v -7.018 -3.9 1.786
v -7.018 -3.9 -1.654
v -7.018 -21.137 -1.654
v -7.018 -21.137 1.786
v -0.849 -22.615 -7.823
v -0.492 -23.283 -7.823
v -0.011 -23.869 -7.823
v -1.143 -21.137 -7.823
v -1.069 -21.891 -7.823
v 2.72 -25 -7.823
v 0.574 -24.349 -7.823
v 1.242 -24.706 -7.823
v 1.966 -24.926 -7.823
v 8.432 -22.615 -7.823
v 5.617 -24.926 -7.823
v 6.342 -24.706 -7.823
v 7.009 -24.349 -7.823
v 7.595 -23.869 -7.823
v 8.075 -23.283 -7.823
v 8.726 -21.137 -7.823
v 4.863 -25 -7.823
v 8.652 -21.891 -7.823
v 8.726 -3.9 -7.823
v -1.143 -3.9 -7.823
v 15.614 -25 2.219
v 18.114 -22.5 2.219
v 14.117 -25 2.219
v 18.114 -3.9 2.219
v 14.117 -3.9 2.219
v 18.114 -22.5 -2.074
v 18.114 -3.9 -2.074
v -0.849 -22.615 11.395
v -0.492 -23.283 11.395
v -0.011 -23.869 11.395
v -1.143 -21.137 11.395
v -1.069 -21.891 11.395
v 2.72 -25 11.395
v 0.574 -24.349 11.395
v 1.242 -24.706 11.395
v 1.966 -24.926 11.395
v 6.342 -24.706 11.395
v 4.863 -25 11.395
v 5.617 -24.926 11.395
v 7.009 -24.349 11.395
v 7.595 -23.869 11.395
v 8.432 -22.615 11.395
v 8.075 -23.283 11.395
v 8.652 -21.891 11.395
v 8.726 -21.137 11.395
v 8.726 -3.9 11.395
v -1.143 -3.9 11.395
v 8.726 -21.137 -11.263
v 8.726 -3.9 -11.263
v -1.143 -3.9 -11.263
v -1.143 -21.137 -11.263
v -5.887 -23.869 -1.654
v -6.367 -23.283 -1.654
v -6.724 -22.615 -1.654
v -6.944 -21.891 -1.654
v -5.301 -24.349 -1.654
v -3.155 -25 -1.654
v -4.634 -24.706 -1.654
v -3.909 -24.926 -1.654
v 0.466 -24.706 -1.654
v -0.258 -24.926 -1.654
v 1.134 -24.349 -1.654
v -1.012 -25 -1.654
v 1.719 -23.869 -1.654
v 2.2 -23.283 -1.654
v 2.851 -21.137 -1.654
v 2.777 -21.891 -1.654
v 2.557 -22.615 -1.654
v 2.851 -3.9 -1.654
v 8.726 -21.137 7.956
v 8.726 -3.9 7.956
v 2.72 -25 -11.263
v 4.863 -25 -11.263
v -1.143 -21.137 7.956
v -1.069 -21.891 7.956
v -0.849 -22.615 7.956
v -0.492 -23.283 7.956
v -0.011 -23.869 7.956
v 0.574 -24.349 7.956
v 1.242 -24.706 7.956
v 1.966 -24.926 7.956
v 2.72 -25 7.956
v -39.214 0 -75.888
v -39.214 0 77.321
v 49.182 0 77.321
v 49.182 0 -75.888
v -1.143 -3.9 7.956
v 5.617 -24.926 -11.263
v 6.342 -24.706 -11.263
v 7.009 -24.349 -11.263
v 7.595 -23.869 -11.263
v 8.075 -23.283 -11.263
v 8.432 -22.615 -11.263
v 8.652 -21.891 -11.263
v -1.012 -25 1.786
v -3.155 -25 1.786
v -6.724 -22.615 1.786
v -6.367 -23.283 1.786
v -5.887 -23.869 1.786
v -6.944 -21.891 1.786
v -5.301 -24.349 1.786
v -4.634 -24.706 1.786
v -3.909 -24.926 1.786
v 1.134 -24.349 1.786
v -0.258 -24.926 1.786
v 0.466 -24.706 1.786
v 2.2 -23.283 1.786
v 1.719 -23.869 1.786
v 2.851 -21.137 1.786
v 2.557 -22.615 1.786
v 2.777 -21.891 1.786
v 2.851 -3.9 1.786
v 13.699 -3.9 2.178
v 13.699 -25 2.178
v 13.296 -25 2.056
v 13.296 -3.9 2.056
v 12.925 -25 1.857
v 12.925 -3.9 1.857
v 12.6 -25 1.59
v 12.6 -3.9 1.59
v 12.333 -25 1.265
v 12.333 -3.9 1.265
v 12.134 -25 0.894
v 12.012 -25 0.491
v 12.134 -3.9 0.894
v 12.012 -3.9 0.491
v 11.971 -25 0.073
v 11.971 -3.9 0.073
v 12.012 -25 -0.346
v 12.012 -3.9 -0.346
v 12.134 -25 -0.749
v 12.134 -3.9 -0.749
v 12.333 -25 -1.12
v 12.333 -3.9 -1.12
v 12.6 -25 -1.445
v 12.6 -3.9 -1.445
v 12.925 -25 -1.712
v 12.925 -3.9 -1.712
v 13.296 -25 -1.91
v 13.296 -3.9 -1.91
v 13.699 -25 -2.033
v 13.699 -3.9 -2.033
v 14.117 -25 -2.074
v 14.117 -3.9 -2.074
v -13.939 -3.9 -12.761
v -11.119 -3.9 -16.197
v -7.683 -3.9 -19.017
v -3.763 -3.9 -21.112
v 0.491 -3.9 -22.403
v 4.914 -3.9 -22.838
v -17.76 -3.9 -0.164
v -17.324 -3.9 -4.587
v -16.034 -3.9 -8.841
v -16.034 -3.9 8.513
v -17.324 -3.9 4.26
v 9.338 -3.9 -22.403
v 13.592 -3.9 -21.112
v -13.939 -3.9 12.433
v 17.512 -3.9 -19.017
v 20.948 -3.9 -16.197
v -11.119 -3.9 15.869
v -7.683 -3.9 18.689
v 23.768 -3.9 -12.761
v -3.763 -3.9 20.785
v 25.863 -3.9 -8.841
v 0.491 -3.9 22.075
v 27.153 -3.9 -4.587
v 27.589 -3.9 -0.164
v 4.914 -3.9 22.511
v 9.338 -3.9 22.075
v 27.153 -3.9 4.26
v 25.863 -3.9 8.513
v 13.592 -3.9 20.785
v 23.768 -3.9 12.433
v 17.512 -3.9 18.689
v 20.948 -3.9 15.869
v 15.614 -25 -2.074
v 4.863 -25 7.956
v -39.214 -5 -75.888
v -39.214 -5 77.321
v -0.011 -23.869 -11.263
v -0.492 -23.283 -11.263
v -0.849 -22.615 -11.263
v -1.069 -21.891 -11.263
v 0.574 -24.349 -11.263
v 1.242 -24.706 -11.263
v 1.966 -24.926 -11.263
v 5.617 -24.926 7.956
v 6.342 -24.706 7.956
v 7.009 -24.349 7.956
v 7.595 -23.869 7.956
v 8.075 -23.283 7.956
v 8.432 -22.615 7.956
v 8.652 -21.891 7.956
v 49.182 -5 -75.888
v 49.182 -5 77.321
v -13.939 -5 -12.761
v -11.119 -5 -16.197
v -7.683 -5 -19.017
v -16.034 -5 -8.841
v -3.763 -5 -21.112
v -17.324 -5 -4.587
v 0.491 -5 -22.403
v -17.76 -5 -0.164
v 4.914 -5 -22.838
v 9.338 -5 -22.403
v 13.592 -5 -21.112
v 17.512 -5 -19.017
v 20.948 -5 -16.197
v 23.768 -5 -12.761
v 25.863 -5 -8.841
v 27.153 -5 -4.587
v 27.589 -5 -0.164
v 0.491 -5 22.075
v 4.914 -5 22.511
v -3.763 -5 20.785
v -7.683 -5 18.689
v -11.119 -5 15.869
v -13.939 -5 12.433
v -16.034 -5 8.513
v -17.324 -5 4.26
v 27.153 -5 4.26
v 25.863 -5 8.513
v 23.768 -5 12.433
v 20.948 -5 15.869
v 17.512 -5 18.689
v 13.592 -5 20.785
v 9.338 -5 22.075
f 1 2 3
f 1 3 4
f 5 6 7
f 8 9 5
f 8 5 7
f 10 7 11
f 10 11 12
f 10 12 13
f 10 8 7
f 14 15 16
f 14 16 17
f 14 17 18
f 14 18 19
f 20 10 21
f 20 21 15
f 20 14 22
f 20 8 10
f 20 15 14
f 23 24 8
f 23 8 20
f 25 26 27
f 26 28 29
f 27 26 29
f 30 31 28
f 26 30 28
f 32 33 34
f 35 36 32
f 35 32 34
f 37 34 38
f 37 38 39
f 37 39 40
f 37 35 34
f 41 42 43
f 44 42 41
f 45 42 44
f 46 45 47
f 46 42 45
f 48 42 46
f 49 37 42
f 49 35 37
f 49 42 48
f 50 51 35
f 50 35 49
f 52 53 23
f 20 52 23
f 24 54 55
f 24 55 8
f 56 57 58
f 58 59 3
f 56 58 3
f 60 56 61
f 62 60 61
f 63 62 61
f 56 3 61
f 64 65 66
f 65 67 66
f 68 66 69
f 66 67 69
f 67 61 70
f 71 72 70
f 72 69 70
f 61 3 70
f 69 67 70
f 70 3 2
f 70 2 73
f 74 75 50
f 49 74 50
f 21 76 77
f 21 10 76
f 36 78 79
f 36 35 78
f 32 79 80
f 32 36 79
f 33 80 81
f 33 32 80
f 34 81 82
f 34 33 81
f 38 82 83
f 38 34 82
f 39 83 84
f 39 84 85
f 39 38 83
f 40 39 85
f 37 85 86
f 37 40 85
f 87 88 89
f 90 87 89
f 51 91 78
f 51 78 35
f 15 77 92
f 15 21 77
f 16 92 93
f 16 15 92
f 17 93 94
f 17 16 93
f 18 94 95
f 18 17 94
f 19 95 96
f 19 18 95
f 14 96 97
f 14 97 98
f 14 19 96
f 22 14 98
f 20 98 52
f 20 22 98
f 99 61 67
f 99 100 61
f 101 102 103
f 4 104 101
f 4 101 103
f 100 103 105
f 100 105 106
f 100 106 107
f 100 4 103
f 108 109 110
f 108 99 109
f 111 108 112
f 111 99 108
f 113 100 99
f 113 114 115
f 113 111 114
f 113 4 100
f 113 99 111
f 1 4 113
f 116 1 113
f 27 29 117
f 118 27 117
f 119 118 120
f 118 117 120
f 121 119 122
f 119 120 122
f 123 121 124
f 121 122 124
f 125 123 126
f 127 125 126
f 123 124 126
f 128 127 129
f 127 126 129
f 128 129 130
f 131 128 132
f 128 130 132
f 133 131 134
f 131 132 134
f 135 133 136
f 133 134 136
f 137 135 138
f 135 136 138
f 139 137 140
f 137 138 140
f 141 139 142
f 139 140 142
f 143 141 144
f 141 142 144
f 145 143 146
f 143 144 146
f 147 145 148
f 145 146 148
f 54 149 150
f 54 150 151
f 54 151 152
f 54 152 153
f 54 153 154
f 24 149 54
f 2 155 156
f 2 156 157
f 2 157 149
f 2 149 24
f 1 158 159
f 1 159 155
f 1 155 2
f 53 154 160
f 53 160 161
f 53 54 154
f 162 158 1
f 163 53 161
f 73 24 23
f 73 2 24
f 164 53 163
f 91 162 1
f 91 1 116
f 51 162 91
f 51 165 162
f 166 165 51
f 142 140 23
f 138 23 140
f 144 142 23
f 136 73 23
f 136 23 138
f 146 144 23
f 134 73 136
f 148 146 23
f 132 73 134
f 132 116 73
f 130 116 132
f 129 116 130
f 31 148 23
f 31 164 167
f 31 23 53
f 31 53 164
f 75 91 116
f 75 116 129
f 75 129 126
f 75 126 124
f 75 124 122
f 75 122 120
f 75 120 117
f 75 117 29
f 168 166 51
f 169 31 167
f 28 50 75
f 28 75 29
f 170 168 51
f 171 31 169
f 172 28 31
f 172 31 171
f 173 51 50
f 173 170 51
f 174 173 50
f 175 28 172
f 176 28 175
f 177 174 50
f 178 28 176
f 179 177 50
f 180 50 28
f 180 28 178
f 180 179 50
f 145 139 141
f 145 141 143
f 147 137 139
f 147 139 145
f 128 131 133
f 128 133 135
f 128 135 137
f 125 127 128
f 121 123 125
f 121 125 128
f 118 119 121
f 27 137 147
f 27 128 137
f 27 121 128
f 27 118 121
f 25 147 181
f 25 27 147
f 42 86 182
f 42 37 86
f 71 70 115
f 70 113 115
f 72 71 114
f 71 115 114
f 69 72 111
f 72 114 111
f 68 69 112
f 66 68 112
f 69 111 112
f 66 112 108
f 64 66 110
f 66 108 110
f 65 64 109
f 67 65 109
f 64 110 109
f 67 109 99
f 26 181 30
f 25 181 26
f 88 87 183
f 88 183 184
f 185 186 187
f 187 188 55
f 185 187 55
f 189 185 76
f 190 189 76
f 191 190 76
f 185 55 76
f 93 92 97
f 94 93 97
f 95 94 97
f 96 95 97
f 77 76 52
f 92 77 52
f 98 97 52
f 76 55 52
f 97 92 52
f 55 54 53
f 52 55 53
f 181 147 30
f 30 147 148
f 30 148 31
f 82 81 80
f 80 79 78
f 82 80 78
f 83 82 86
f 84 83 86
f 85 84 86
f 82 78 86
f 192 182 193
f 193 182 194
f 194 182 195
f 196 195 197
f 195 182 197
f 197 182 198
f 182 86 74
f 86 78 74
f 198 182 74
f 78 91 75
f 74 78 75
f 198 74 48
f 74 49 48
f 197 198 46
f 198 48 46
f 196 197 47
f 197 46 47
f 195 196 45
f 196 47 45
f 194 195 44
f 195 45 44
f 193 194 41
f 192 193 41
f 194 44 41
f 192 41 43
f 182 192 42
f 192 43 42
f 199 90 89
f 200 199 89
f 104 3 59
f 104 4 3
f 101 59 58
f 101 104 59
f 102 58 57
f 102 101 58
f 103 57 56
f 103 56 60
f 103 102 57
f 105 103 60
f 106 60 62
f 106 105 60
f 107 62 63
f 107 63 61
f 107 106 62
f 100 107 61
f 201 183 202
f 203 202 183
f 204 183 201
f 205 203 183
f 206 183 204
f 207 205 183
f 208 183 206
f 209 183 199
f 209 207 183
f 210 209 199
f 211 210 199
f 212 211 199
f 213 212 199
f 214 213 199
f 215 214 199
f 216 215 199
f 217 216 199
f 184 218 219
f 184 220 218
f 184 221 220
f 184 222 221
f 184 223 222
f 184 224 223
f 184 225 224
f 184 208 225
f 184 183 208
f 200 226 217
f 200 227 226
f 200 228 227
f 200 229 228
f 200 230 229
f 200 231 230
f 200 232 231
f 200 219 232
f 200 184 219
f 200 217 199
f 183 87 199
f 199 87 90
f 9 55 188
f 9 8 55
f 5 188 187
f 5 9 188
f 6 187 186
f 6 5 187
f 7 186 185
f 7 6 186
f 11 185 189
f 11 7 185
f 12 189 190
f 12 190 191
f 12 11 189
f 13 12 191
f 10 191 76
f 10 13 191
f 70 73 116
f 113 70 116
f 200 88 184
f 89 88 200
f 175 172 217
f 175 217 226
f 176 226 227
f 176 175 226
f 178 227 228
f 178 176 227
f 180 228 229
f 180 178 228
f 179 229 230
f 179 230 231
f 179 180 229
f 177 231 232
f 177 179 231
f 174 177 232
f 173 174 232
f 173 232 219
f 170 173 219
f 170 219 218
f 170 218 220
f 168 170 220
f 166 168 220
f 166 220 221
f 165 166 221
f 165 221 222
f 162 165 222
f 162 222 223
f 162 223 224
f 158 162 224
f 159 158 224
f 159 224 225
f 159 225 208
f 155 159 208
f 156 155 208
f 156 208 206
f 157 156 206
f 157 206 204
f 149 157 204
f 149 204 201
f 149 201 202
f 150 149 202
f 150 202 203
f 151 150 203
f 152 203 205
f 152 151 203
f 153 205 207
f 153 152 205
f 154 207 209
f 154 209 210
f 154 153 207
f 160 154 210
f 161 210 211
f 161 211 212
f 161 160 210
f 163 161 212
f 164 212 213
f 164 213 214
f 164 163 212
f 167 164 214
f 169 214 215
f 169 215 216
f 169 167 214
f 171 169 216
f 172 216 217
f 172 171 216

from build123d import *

# Parameters (mm, degrees)
F0_W     = 88.39527
F0_H     = 153.20968
F0_R     = 22.6744372739
F1_DEPTH = 5
F0_W_2   = 9.8689098377
F0_H_2   = 3.4395875409
F0_W_3   = 9.86891
F0_H_3   = 3.43959
F2_DEPTH = 3.9
F3_DEPTH = 25
F4_R     = 3.8627416998
F5_SIZE  = 2.5


# Not quite as in the source:
# - a feature names something its author has since deleted; it is built from what else it names


with BuildPart() as f1:
    # F0 (on Front) → F1 (new body)
    with BuildSketch(Plane.XZ):
        with Locations((4.9840081745, 0.7166508444)):
            Rectangle(F0_W, F0_H)
        with Locations((4.9144495279, -0.1638149843)):
            Circle(F0_R, mode=Mode.SUBTRACT)
    extrude(amount=F1_DEPTH)

    # F0 (on Front) → F2 (join)
    with BuildSketch(Plane.XZ):
        with Locations((4.9144495279, -0.1638149843)):
            Circle(F0_R)
        with Locations((3.791642841, -9.5432697745)):
            Rectangle(F0_W_2, F0_H_2, mode=Mode.SUBTRACT)
        with Locations((-2.0837161803, 0.0662026977)):
            Rectangle(F0_W_3, F0_H_3, mode=Mode.SUBTRACT)
        with BuildLine():
            Line((18.1140358327, 2.2190151321), (18.1140358327, -2.0737481719))
            Line((18.1140358327, -2.0737481719), (14.117325074, -2.0737481719))
            ThreePointArc((14.117325074, -2.0737481719), (11.9709434221, 0.0726334801), (14.117325074, 2.2190151321))
            Line((14.117325074, 2.2190151321), (18.1140358327, 2.2190151321))
        make_face(mode=Mode.SUBTRACT)
        with Locations((3.791642841, 9.6756751699)):
            Rectangle(F0_W_2, F0_H_2, mode=Mode.SUBTRACT)
    extrude(amount=F2_DEPTH)

    # F0 (on Front) → F3 (join)
    with BuildSketch(Plane.XZ):
        with Locations((3.791642841, -9.5432697745)):
            Rectangle(F0_W_2, F0_H_2)
        with Locations((-2.0837161803, 0.0662026977)):
            Rectangle(F0_W_3, F0_H_3)
        with Locations((3.791642841, 9.6756751699)):
            Rectangle(F0_W_2, F0_H_2)
        with BuildLine():
            Line((14.117325074, -2.0737481719), (18.1140358327, -2.0737481719))
            Line((18.1140358327, -2.0737481719), (18.1140358327, 2.2190151321))
            Line((18.1140358327, 2.2190151321), (14.117325074, 2.2190151321))
            ThreePointArc((14.117325074, 2.2190151321), (11.9709434221, 0.0726334801), (14.117325074, -2.0737481719))
        make_face()
    extrude(amount=F3_DEPTH)

    # F4
    f4_edges = [f1.edges().sort_by_distance(p)[0] for p in [
        (-1.142812, -25, -9.54327),
        (8.726098, -25, -9.54327),
        (-7.018171, -25, 0.066203),
        (2.850739, -25, 0.066203),
        (8.726098, -25, 9.675675),
        (-1.142812, -25, 9.675675),
    ]]
    fillet(f4_edges, radius=F4_R)

    # F5
    f5_edges = [f1.edges().sort_by_distance(p)[0] for p in [
        (18.114036, -25, 0.072633),
    ]]
    chamfer(f5_edges, length=F5_SIZE)


solid = f1.part
